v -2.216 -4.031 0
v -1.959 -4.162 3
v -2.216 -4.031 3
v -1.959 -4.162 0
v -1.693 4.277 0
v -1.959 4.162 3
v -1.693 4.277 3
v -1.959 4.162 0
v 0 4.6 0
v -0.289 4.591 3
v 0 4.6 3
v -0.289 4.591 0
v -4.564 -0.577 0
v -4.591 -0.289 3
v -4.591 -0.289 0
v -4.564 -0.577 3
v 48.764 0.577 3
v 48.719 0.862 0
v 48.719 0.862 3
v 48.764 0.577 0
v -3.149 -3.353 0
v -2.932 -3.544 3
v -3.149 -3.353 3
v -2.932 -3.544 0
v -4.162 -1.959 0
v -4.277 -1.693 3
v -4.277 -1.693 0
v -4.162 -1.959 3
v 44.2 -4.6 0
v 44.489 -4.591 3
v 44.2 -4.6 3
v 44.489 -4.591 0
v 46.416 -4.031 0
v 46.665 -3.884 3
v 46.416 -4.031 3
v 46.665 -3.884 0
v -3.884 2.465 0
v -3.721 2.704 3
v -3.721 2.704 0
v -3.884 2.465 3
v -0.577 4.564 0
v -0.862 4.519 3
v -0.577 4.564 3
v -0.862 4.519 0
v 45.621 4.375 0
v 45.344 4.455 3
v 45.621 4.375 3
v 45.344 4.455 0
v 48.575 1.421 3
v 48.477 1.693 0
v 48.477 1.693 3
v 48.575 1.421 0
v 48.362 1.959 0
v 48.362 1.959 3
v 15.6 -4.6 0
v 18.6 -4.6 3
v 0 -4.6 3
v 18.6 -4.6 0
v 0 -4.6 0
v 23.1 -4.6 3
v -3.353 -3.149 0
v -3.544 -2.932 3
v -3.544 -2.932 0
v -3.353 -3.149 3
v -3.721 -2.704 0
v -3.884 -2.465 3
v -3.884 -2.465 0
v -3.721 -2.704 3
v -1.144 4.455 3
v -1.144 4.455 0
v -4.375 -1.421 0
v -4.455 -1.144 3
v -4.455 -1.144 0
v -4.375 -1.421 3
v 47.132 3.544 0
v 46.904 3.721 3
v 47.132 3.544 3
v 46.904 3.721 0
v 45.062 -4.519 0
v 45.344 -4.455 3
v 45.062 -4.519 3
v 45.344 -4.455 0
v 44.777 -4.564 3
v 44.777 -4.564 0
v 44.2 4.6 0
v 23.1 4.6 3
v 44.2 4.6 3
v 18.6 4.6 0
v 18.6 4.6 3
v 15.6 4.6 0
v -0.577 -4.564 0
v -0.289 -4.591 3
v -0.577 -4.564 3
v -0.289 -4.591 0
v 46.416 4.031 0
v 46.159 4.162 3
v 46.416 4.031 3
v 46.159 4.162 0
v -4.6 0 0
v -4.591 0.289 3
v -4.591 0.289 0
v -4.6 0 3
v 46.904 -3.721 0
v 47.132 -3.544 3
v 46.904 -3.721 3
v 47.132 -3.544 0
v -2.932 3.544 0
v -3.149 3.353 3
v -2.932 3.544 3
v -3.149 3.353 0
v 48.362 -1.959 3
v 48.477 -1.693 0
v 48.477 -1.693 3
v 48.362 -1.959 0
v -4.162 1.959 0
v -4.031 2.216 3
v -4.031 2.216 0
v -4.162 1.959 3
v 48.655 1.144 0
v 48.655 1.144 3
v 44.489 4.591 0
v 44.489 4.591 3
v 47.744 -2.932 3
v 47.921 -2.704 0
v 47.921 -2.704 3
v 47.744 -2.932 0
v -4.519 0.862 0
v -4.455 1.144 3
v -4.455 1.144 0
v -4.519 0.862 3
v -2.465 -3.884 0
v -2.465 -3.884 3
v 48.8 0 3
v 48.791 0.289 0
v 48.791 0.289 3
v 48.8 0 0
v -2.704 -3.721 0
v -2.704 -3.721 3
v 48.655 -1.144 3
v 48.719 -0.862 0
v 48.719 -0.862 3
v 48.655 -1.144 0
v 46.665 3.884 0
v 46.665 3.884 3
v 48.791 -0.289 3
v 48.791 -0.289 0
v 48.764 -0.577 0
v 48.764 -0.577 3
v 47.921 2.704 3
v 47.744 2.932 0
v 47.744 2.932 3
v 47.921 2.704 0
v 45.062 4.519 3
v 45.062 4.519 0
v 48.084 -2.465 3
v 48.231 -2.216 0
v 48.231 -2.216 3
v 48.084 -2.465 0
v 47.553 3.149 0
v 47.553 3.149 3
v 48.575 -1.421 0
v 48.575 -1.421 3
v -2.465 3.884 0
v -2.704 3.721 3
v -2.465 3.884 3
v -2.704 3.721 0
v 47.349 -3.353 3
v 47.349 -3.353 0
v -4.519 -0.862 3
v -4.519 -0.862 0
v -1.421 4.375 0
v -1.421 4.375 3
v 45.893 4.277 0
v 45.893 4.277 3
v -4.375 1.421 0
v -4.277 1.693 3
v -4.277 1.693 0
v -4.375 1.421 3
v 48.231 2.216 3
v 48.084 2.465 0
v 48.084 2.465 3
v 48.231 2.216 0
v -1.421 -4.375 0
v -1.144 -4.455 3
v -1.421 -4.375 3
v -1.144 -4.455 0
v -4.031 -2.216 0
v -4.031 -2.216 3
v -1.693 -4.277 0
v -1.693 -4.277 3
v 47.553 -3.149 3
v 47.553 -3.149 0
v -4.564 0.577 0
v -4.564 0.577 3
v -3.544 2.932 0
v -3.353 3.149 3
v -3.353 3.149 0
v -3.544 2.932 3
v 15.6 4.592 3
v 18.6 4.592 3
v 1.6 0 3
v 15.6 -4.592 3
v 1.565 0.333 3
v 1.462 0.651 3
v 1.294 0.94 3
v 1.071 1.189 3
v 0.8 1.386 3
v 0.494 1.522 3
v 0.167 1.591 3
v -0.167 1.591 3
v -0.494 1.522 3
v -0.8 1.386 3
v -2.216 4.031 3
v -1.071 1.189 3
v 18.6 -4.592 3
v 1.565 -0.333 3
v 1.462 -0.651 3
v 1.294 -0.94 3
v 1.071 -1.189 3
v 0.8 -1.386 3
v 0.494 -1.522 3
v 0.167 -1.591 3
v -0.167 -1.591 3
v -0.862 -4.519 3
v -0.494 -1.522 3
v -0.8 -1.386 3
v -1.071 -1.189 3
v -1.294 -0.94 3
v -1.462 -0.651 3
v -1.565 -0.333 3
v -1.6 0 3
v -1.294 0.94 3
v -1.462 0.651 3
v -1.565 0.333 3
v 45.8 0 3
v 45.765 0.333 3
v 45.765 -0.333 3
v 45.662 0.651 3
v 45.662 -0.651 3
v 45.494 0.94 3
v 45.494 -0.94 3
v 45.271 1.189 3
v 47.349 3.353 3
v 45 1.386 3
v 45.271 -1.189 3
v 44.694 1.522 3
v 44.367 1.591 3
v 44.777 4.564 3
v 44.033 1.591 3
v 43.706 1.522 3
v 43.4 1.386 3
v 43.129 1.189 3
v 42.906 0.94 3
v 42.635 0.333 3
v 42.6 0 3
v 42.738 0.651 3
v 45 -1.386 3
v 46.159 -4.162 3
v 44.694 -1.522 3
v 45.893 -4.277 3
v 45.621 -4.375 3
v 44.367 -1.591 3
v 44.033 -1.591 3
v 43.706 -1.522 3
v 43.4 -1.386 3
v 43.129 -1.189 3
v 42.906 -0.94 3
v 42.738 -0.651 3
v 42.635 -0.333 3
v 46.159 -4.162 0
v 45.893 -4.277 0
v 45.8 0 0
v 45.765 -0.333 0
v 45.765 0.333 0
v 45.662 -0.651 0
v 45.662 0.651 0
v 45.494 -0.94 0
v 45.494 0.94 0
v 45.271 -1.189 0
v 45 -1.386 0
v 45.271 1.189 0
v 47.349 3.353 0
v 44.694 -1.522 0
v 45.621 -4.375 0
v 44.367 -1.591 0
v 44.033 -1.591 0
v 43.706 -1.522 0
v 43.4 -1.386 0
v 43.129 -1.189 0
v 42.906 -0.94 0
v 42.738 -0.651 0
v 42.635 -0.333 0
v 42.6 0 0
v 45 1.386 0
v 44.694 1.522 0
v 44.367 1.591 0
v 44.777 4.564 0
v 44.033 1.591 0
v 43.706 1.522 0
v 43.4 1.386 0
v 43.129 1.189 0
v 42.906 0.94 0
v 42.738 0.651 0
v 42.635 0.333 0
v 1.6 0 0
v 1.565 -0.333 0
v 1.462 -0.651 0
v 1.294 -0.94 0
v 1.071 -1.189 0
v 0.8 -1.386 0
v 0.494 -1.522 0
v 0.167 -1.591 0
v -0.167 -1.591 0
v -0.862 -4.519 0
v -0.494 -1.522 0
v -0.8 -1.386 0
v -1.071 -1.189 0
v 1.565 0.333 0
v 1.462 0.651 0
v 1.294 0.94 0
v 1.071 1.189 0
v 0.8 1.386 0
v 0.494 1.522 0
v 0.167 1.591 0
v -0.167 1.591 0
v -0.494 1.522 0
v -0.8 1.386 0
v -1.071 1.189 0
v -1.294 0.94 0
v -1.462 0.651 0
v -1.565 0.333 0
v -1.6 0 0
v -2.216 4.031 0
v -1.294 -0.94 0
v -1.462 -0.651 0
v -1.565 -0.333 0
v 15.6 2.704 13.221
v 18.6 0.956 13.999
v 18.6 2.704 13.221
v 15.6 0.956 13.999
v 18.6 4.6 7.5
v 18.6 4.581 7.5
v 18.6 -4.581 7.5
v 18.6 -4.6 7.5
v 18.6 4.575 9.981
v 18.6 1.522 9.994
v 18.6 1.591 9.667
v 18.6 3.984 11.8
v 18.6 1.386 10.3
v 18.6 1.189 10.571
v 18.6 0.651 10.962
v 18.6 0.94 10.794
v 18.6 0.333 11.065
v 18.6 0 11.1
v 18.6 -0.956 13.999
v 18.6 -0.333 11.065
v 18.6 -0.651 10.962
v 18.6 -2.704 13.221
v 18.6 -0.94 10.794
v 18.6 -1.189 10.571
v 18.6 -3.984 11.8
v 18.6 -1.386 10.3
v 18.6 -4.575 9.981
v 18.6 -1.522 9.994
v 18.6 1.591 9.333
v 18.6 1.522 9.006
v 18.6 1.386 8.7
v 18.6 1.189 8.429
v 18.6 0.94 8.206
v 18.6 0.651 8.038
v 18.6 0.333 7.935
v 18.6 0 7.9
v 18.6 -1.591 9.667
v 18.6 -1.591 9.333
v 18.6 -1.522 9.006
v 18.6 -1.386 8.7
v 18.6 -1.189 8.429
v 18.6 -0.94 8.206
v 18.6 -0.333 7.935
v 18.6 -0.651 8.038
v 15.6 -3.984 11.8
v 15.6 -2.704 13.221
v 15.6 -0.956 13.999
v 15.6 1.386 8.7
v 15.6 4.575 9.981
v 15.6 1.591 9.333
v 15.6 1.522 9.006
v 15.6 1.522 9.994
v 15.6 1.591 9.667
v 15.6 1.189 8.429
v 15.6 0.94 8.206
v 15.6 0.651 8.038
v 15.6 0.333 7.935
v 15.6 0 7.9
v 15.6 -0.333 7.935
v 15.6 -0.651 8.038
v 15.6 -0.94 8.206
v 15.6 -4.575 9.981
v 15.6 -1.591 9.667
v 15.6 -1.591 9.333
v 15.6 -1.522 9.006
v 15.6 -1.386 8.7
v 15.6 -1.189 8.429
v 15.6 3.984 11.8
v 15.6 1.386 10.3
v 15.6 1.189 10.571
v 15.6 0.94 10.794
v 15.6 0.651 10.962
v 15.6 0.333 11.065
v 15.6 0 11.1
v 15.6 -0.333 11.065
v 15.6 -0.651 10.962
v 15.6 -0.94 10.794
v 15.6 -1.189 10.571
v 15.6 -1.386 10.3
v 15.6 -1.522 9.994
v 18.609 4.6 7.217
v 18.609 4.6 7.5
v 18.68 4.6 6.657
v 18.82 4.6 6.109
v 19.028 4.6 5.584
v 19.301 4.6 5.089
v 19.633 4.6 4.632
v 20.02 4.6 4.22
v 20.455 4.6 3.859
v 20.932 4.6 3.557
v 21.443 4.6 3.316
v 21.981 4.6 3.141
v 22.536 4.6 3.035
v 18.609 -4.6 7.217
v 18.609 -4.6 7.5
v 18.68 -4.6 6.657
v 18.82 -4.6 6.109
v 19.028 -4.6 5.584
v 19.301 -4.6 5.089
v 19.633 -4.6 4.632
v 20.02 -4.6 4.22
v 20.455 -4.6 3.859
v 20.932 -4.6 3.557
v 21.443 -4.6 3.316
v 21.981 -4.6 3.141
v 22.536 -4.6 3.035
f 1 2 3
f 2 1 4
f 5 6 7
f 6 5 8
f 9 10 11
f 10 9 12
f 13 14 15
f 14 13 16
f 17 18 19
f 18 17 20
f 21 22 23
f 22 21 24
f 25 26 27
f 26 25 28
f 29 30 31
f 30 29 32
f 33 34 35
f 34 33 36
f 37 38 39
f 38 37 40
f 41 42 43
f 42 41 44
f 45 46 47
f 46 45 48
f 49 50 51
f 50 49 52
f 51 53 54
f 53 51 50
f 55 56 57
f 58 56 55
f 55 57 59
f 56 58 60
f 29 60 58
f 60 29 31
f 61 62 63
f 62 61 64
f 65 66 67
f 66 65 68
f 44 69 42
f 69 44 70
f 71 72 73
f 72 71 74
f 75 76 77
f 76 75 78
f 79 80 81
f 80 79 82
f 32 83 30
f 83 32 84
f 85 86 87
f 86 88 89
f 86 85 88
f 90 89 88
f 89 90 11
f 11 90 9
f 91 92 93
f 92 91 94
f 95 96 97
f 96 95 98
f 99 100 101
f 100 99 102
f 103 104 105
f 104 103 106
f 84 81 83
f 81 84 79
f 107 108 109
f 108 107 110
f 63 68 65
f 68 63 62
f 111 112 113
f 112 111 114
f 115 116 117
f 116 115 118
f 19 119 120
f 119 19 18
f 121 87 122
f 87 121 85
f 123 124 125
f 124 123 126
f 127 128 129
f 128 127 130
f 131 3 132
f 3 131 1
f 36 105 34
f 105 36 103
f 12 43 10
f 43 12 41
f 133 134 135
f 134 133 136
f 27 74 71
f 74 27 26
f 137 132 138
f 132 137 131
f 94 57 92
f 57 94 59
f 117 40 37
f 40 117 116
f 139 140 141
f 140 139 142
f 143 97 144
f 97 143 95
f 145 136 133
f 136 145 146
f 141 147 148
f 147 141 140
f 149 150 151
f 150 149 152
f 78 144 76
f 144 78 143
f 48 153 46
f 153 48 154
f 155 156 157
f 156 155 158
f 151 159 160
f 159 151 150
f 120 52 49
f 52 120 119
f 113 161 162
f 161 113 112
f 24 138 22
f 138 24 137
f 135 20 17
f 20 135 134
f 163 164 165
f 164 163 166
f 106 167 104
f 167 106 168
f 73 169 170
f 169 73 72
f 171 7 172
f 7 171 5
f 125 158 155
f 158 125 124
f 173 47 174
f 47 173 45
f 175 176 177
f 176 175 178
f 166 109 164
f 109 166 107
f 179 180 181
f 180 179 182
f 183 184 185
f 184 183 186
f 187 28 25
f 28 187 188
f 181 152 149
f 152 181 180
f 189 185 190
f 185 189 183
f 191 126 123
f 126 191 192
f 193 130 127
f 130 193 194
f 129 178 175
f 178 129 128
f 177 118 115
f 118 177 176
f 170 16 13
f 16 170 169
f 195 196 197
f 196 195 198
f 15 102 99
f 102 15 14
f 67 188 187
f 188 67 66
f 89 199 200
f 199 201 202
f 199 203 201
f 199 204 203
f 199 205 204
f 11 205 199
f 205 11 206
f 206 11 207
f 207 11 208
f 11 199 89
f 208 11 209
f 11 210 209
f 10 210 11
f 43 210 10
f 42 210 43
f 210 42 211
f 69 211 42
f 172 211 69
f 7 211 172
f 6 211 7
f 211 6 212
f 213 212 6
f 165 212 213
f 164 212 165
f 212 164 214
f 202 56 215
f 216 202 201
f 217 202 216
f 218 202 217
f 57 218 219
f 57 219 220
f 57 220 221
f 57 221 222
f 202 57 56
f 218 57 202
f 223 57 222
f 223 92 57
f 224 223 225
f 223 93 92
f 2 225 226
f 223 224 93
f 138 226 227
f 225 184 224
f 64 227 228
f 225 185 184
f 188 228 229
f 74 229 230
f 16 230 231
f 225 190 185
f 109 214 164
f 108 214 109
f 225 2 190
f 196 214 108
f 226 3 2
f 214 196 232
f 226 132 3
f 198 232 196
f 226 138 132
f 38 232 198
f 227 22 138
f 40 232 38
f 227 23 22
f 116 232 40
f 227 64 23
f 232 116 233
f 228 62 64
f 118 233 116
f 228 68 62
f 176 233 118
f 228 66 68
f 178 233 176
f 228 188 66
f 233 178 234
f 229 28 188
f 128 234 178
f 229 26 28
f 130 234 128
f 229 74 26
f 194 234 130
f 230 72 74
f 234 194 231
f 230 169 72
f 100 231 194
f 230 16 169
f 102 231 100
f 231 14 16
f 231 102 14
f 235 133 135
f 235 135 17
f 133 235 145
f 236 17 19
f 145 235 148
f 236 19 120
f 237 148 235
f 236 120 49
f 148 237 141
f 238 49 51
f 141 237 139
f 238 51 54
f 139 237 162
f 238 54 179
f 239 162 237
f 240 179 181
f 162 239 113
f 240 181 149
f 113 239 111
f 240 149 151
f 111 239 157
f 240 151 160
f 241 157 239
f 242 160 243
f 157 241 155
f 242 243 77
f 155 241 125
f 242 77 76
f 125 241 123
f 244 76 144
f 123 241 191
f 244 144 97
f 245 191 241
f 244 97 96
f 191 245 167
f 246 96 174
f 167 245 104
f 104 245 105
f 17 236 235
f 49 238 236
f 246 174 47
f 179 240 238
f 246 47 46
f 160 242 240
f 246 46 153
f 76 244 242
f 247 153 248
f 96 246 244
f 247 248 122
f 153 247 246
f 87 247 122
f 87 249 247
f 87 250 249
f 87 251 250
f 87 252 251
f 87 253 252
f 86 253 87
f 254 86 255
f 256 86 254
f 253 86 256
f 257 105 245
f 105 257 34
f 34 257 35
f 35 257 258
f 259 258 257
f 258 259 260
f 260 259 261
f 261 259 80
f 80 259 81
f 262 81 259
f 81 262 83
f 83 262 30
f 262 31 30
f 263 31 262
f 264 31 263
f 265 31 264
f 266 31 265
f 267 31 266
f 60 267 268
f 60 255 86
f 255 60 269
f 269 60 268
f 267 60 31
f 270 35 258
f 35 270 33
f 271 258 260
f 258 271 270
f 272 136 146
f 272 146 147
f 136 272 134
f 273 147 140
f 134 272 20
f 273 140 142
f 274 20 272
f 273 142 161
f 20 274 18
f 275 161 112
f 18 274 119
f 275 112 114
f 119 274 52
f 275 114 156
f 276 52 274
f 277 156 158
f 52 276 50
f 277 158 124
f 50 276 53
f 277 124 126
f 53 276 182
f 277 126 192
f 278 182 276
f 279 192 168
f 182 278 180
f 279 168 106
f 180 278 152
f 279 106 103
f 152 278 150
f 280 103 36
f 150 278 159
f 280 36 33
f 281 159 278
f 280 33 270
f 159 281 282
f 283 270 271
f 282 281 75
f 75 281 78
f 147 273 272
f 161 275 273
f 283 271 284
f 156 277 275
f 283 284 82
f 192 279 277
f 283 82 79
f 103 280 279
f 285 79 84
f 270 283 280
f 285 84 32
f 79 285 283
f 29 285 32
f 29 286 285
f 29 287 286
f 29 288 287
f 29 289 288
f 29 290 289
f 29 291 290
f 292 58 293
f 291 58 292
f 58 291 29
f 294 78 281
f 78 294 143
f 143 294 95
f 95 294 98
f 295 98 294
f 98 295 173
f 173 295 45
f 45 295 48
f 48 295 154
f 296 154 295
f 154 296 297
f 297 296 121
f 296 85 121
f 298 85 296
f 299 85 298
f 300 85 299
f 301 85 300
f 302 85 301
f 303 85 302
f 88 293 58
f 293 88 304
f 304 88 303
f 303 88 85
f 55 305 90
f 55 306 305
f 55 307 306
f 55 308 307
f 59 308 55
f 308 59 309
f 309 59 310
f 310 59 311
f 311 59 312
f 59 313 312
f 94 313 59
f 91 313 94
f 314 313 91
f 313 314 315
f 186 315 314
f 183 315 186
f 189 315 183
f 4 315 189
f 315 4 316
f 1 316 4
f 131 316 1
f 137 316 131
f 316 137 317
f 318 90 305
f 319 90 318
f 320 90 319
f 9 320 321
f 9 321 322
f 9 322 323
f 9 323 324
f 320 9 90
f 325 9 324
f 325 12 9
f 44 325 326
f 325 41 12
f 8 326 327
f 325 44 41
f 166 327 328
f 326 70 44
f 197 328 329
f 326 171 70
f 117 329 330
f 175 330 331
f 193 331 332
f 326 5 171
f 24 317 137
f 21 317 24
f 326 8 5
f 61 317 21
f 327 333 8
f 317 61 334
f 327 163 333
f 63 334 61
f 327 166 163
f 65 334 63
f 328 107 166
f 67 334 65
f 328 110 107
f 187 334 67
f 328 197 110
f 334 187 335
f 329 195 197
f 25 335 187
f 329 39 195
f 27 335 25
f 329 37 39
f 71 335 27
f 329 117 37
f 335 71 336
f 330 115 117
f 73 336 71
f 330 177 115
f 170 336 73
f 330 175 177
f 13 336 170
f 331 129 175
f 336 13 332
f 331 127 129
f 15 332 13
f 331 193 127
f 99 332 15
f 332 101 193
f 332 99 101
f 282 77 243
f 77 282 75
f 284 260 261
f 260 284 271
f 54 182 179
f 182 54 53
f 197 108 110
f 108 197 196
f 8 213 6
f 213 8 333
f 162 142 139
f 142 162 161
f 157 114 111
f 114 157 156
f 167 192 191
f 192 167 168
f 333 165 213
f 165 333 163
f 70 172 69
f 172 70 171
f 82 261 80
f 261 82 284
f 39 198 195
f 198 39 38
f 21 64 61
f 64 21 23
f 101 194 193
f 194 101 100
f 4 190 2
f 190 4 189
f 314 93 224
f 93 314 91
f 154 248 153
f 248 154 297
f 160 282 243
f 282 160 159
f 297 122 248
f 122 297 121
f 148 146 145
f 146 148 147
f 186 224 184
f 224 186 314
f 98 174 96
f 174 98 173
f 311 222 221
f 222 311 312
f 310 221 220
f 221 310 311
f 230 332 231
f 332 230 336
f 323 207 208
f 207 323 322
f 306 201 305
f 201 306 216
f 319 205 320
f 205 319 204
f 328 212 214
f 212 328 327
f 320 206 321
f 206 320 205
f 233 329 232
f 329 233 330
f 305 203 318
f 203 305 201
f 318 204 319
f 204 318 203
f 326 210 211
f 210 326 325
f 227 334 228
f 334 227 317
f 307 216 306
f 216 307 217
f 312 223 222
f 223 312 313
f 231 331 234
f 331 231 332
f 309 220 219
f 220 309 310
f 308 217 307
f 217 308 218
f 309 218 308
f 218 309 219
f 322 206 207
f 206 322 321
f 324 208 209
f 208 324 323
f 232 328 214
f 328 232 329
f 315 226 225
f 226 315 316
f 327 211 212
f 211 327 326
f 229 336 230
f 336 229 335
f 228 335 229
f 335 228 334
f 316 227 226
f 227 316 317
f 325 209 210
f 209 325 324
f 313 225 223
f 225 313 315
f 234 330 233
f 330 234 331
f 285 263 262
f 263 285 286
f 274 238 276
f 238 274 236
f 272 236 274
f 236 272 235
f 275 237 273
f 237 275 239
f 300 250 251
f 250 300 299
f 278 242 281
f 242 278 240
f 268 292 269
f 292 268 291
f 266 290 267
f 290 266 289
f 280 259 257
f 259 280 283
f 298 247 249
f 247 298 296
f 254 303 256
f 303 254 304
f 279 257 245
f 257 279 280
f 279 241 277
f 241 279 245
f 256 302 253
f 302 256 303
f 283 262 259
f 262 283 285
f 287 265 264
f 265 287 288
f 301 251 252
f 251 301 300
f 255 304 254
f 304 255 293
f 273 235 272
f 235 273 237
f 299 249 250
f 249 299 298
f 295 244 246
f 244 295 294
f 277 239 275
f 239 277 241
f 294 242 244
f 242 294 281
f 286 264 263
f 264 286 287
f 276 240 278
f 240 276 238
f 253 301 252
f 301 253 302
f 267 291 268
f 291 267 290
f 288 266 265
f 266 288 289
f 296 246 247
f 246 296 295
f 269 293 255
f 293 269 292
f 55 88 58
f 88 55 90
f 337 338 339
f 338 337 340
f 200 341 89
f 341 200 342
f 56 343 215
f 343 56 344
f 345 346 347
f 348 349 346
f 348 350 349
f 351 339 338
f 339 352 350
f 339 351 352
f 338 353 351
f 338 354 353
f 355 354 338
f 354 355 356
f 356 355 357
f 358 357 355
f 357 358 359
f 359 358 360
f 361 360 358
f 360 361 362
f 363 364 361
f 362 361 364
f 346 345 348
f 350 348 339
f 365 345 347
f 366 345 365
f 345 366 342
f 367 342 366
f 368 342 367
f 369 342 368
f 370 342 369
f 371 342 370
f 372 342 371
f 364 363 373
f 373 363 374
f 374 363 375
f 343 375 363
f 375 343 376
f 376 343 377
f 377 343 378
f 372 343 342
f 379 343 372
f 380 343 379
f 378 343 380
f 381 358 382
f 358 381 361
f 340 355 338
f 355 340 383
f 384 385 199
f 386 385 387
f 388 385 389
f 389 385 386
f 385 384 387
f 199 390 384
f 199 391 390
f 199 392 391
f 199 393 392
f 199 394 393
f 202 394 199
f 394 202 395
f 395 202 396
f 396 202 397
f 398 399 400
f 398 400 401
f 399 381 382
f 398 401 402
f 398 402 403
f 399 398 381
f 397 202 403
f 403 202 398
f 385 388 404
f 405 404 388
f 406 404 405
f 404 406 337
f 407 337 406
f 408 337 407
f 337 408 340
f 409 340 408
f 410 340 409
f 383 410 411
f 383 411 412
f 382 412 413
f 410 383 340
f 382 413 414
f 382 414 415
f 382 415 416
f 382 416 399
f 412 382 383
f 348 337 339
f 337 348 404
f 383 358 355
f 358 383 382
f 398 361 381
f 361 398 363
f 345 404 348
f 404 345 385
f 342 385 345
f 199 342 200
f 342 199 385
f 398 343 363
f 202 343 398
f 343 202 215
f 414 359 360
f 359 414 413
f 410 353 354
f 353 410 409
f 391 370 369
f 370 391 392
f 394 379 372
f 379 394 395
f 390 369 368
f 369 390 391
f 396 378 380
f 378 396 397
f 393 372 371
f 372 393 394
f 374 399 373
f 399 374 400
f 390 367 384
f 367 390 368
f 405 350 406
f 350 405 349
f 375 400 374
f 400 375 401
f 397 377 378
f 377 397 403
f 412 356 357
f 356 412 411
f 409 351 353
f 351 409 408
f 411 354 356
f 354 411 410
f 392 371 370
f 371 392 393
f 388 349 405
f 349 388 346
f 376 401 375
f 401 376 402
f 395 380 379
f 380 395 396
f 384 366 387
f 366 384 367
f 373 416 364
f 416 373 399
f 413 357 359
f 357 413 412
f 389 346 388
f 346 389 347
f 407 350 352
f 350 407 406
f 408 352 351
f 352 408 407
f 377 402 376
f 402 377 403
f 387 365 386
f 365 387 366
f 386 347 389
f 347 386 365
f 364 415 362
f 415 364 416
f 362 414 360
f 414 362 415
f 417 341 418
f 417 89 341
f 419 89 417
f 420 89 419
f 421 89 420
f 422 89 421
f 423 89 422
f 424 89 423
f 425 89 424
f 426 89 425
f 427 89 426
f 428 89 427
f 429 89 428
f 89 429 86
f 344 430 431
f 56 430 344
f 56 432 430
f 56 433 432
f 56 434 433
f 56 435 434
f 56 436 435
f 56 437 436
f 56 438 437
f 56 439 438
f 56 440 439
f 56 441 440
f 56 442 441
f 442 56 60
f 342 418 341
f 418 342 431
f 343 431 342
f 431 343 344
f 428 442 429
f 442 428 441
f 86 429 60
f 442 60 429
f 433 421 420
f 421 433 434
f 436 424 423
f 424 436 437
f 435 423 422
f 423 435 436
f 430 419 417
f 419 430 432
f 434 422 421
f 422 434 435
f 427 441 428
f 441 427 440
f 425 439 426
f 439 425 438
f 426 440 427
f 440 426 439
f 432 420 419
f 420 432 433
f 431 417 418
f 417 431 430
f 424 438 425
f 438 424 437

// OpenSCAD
screw_r = 3.2/2;
th = 3;
outer_r = screw_r + th;
dst = 44.2;

module s() { cylinder(r=screw_r, h=100, center=true, $fn=30); }

module base() {
    difference() {
        hull() {
            cylinder(r=outer_r, h=th, $fn=100);
            translate([dst,0,0])
            cylinder(r=outer_r, h=th, $fn=100);
        }
        
        s();
        translate([dst,0,0]) s();
    }
}

base();




module reinforcement(size, r) {
    translate([r,-outer_r,r])
    rotate([0,90,90])
    difference() {
        cube([r,r,size]);
        cylinder(r = r, h = size, $fn=50);
    }
}


module up() {
    difference() {
        hull() {
            translate([0,0,6.5+th])
            rotate([0,90,0])
            cylinder(r=outer_r, h=th, center=true);
                    
            cube([th, 2*outer_r, 0.00001], center=true);
        }
        translate([0,0,6.5+th])
        rotate([0,90,0])
        s();
    }
    
    translate([th/2,0,th])
    reinforcement(size=outer_r*2, r = 4.5);
}

translate([dst/2-5,0,0])
up();
